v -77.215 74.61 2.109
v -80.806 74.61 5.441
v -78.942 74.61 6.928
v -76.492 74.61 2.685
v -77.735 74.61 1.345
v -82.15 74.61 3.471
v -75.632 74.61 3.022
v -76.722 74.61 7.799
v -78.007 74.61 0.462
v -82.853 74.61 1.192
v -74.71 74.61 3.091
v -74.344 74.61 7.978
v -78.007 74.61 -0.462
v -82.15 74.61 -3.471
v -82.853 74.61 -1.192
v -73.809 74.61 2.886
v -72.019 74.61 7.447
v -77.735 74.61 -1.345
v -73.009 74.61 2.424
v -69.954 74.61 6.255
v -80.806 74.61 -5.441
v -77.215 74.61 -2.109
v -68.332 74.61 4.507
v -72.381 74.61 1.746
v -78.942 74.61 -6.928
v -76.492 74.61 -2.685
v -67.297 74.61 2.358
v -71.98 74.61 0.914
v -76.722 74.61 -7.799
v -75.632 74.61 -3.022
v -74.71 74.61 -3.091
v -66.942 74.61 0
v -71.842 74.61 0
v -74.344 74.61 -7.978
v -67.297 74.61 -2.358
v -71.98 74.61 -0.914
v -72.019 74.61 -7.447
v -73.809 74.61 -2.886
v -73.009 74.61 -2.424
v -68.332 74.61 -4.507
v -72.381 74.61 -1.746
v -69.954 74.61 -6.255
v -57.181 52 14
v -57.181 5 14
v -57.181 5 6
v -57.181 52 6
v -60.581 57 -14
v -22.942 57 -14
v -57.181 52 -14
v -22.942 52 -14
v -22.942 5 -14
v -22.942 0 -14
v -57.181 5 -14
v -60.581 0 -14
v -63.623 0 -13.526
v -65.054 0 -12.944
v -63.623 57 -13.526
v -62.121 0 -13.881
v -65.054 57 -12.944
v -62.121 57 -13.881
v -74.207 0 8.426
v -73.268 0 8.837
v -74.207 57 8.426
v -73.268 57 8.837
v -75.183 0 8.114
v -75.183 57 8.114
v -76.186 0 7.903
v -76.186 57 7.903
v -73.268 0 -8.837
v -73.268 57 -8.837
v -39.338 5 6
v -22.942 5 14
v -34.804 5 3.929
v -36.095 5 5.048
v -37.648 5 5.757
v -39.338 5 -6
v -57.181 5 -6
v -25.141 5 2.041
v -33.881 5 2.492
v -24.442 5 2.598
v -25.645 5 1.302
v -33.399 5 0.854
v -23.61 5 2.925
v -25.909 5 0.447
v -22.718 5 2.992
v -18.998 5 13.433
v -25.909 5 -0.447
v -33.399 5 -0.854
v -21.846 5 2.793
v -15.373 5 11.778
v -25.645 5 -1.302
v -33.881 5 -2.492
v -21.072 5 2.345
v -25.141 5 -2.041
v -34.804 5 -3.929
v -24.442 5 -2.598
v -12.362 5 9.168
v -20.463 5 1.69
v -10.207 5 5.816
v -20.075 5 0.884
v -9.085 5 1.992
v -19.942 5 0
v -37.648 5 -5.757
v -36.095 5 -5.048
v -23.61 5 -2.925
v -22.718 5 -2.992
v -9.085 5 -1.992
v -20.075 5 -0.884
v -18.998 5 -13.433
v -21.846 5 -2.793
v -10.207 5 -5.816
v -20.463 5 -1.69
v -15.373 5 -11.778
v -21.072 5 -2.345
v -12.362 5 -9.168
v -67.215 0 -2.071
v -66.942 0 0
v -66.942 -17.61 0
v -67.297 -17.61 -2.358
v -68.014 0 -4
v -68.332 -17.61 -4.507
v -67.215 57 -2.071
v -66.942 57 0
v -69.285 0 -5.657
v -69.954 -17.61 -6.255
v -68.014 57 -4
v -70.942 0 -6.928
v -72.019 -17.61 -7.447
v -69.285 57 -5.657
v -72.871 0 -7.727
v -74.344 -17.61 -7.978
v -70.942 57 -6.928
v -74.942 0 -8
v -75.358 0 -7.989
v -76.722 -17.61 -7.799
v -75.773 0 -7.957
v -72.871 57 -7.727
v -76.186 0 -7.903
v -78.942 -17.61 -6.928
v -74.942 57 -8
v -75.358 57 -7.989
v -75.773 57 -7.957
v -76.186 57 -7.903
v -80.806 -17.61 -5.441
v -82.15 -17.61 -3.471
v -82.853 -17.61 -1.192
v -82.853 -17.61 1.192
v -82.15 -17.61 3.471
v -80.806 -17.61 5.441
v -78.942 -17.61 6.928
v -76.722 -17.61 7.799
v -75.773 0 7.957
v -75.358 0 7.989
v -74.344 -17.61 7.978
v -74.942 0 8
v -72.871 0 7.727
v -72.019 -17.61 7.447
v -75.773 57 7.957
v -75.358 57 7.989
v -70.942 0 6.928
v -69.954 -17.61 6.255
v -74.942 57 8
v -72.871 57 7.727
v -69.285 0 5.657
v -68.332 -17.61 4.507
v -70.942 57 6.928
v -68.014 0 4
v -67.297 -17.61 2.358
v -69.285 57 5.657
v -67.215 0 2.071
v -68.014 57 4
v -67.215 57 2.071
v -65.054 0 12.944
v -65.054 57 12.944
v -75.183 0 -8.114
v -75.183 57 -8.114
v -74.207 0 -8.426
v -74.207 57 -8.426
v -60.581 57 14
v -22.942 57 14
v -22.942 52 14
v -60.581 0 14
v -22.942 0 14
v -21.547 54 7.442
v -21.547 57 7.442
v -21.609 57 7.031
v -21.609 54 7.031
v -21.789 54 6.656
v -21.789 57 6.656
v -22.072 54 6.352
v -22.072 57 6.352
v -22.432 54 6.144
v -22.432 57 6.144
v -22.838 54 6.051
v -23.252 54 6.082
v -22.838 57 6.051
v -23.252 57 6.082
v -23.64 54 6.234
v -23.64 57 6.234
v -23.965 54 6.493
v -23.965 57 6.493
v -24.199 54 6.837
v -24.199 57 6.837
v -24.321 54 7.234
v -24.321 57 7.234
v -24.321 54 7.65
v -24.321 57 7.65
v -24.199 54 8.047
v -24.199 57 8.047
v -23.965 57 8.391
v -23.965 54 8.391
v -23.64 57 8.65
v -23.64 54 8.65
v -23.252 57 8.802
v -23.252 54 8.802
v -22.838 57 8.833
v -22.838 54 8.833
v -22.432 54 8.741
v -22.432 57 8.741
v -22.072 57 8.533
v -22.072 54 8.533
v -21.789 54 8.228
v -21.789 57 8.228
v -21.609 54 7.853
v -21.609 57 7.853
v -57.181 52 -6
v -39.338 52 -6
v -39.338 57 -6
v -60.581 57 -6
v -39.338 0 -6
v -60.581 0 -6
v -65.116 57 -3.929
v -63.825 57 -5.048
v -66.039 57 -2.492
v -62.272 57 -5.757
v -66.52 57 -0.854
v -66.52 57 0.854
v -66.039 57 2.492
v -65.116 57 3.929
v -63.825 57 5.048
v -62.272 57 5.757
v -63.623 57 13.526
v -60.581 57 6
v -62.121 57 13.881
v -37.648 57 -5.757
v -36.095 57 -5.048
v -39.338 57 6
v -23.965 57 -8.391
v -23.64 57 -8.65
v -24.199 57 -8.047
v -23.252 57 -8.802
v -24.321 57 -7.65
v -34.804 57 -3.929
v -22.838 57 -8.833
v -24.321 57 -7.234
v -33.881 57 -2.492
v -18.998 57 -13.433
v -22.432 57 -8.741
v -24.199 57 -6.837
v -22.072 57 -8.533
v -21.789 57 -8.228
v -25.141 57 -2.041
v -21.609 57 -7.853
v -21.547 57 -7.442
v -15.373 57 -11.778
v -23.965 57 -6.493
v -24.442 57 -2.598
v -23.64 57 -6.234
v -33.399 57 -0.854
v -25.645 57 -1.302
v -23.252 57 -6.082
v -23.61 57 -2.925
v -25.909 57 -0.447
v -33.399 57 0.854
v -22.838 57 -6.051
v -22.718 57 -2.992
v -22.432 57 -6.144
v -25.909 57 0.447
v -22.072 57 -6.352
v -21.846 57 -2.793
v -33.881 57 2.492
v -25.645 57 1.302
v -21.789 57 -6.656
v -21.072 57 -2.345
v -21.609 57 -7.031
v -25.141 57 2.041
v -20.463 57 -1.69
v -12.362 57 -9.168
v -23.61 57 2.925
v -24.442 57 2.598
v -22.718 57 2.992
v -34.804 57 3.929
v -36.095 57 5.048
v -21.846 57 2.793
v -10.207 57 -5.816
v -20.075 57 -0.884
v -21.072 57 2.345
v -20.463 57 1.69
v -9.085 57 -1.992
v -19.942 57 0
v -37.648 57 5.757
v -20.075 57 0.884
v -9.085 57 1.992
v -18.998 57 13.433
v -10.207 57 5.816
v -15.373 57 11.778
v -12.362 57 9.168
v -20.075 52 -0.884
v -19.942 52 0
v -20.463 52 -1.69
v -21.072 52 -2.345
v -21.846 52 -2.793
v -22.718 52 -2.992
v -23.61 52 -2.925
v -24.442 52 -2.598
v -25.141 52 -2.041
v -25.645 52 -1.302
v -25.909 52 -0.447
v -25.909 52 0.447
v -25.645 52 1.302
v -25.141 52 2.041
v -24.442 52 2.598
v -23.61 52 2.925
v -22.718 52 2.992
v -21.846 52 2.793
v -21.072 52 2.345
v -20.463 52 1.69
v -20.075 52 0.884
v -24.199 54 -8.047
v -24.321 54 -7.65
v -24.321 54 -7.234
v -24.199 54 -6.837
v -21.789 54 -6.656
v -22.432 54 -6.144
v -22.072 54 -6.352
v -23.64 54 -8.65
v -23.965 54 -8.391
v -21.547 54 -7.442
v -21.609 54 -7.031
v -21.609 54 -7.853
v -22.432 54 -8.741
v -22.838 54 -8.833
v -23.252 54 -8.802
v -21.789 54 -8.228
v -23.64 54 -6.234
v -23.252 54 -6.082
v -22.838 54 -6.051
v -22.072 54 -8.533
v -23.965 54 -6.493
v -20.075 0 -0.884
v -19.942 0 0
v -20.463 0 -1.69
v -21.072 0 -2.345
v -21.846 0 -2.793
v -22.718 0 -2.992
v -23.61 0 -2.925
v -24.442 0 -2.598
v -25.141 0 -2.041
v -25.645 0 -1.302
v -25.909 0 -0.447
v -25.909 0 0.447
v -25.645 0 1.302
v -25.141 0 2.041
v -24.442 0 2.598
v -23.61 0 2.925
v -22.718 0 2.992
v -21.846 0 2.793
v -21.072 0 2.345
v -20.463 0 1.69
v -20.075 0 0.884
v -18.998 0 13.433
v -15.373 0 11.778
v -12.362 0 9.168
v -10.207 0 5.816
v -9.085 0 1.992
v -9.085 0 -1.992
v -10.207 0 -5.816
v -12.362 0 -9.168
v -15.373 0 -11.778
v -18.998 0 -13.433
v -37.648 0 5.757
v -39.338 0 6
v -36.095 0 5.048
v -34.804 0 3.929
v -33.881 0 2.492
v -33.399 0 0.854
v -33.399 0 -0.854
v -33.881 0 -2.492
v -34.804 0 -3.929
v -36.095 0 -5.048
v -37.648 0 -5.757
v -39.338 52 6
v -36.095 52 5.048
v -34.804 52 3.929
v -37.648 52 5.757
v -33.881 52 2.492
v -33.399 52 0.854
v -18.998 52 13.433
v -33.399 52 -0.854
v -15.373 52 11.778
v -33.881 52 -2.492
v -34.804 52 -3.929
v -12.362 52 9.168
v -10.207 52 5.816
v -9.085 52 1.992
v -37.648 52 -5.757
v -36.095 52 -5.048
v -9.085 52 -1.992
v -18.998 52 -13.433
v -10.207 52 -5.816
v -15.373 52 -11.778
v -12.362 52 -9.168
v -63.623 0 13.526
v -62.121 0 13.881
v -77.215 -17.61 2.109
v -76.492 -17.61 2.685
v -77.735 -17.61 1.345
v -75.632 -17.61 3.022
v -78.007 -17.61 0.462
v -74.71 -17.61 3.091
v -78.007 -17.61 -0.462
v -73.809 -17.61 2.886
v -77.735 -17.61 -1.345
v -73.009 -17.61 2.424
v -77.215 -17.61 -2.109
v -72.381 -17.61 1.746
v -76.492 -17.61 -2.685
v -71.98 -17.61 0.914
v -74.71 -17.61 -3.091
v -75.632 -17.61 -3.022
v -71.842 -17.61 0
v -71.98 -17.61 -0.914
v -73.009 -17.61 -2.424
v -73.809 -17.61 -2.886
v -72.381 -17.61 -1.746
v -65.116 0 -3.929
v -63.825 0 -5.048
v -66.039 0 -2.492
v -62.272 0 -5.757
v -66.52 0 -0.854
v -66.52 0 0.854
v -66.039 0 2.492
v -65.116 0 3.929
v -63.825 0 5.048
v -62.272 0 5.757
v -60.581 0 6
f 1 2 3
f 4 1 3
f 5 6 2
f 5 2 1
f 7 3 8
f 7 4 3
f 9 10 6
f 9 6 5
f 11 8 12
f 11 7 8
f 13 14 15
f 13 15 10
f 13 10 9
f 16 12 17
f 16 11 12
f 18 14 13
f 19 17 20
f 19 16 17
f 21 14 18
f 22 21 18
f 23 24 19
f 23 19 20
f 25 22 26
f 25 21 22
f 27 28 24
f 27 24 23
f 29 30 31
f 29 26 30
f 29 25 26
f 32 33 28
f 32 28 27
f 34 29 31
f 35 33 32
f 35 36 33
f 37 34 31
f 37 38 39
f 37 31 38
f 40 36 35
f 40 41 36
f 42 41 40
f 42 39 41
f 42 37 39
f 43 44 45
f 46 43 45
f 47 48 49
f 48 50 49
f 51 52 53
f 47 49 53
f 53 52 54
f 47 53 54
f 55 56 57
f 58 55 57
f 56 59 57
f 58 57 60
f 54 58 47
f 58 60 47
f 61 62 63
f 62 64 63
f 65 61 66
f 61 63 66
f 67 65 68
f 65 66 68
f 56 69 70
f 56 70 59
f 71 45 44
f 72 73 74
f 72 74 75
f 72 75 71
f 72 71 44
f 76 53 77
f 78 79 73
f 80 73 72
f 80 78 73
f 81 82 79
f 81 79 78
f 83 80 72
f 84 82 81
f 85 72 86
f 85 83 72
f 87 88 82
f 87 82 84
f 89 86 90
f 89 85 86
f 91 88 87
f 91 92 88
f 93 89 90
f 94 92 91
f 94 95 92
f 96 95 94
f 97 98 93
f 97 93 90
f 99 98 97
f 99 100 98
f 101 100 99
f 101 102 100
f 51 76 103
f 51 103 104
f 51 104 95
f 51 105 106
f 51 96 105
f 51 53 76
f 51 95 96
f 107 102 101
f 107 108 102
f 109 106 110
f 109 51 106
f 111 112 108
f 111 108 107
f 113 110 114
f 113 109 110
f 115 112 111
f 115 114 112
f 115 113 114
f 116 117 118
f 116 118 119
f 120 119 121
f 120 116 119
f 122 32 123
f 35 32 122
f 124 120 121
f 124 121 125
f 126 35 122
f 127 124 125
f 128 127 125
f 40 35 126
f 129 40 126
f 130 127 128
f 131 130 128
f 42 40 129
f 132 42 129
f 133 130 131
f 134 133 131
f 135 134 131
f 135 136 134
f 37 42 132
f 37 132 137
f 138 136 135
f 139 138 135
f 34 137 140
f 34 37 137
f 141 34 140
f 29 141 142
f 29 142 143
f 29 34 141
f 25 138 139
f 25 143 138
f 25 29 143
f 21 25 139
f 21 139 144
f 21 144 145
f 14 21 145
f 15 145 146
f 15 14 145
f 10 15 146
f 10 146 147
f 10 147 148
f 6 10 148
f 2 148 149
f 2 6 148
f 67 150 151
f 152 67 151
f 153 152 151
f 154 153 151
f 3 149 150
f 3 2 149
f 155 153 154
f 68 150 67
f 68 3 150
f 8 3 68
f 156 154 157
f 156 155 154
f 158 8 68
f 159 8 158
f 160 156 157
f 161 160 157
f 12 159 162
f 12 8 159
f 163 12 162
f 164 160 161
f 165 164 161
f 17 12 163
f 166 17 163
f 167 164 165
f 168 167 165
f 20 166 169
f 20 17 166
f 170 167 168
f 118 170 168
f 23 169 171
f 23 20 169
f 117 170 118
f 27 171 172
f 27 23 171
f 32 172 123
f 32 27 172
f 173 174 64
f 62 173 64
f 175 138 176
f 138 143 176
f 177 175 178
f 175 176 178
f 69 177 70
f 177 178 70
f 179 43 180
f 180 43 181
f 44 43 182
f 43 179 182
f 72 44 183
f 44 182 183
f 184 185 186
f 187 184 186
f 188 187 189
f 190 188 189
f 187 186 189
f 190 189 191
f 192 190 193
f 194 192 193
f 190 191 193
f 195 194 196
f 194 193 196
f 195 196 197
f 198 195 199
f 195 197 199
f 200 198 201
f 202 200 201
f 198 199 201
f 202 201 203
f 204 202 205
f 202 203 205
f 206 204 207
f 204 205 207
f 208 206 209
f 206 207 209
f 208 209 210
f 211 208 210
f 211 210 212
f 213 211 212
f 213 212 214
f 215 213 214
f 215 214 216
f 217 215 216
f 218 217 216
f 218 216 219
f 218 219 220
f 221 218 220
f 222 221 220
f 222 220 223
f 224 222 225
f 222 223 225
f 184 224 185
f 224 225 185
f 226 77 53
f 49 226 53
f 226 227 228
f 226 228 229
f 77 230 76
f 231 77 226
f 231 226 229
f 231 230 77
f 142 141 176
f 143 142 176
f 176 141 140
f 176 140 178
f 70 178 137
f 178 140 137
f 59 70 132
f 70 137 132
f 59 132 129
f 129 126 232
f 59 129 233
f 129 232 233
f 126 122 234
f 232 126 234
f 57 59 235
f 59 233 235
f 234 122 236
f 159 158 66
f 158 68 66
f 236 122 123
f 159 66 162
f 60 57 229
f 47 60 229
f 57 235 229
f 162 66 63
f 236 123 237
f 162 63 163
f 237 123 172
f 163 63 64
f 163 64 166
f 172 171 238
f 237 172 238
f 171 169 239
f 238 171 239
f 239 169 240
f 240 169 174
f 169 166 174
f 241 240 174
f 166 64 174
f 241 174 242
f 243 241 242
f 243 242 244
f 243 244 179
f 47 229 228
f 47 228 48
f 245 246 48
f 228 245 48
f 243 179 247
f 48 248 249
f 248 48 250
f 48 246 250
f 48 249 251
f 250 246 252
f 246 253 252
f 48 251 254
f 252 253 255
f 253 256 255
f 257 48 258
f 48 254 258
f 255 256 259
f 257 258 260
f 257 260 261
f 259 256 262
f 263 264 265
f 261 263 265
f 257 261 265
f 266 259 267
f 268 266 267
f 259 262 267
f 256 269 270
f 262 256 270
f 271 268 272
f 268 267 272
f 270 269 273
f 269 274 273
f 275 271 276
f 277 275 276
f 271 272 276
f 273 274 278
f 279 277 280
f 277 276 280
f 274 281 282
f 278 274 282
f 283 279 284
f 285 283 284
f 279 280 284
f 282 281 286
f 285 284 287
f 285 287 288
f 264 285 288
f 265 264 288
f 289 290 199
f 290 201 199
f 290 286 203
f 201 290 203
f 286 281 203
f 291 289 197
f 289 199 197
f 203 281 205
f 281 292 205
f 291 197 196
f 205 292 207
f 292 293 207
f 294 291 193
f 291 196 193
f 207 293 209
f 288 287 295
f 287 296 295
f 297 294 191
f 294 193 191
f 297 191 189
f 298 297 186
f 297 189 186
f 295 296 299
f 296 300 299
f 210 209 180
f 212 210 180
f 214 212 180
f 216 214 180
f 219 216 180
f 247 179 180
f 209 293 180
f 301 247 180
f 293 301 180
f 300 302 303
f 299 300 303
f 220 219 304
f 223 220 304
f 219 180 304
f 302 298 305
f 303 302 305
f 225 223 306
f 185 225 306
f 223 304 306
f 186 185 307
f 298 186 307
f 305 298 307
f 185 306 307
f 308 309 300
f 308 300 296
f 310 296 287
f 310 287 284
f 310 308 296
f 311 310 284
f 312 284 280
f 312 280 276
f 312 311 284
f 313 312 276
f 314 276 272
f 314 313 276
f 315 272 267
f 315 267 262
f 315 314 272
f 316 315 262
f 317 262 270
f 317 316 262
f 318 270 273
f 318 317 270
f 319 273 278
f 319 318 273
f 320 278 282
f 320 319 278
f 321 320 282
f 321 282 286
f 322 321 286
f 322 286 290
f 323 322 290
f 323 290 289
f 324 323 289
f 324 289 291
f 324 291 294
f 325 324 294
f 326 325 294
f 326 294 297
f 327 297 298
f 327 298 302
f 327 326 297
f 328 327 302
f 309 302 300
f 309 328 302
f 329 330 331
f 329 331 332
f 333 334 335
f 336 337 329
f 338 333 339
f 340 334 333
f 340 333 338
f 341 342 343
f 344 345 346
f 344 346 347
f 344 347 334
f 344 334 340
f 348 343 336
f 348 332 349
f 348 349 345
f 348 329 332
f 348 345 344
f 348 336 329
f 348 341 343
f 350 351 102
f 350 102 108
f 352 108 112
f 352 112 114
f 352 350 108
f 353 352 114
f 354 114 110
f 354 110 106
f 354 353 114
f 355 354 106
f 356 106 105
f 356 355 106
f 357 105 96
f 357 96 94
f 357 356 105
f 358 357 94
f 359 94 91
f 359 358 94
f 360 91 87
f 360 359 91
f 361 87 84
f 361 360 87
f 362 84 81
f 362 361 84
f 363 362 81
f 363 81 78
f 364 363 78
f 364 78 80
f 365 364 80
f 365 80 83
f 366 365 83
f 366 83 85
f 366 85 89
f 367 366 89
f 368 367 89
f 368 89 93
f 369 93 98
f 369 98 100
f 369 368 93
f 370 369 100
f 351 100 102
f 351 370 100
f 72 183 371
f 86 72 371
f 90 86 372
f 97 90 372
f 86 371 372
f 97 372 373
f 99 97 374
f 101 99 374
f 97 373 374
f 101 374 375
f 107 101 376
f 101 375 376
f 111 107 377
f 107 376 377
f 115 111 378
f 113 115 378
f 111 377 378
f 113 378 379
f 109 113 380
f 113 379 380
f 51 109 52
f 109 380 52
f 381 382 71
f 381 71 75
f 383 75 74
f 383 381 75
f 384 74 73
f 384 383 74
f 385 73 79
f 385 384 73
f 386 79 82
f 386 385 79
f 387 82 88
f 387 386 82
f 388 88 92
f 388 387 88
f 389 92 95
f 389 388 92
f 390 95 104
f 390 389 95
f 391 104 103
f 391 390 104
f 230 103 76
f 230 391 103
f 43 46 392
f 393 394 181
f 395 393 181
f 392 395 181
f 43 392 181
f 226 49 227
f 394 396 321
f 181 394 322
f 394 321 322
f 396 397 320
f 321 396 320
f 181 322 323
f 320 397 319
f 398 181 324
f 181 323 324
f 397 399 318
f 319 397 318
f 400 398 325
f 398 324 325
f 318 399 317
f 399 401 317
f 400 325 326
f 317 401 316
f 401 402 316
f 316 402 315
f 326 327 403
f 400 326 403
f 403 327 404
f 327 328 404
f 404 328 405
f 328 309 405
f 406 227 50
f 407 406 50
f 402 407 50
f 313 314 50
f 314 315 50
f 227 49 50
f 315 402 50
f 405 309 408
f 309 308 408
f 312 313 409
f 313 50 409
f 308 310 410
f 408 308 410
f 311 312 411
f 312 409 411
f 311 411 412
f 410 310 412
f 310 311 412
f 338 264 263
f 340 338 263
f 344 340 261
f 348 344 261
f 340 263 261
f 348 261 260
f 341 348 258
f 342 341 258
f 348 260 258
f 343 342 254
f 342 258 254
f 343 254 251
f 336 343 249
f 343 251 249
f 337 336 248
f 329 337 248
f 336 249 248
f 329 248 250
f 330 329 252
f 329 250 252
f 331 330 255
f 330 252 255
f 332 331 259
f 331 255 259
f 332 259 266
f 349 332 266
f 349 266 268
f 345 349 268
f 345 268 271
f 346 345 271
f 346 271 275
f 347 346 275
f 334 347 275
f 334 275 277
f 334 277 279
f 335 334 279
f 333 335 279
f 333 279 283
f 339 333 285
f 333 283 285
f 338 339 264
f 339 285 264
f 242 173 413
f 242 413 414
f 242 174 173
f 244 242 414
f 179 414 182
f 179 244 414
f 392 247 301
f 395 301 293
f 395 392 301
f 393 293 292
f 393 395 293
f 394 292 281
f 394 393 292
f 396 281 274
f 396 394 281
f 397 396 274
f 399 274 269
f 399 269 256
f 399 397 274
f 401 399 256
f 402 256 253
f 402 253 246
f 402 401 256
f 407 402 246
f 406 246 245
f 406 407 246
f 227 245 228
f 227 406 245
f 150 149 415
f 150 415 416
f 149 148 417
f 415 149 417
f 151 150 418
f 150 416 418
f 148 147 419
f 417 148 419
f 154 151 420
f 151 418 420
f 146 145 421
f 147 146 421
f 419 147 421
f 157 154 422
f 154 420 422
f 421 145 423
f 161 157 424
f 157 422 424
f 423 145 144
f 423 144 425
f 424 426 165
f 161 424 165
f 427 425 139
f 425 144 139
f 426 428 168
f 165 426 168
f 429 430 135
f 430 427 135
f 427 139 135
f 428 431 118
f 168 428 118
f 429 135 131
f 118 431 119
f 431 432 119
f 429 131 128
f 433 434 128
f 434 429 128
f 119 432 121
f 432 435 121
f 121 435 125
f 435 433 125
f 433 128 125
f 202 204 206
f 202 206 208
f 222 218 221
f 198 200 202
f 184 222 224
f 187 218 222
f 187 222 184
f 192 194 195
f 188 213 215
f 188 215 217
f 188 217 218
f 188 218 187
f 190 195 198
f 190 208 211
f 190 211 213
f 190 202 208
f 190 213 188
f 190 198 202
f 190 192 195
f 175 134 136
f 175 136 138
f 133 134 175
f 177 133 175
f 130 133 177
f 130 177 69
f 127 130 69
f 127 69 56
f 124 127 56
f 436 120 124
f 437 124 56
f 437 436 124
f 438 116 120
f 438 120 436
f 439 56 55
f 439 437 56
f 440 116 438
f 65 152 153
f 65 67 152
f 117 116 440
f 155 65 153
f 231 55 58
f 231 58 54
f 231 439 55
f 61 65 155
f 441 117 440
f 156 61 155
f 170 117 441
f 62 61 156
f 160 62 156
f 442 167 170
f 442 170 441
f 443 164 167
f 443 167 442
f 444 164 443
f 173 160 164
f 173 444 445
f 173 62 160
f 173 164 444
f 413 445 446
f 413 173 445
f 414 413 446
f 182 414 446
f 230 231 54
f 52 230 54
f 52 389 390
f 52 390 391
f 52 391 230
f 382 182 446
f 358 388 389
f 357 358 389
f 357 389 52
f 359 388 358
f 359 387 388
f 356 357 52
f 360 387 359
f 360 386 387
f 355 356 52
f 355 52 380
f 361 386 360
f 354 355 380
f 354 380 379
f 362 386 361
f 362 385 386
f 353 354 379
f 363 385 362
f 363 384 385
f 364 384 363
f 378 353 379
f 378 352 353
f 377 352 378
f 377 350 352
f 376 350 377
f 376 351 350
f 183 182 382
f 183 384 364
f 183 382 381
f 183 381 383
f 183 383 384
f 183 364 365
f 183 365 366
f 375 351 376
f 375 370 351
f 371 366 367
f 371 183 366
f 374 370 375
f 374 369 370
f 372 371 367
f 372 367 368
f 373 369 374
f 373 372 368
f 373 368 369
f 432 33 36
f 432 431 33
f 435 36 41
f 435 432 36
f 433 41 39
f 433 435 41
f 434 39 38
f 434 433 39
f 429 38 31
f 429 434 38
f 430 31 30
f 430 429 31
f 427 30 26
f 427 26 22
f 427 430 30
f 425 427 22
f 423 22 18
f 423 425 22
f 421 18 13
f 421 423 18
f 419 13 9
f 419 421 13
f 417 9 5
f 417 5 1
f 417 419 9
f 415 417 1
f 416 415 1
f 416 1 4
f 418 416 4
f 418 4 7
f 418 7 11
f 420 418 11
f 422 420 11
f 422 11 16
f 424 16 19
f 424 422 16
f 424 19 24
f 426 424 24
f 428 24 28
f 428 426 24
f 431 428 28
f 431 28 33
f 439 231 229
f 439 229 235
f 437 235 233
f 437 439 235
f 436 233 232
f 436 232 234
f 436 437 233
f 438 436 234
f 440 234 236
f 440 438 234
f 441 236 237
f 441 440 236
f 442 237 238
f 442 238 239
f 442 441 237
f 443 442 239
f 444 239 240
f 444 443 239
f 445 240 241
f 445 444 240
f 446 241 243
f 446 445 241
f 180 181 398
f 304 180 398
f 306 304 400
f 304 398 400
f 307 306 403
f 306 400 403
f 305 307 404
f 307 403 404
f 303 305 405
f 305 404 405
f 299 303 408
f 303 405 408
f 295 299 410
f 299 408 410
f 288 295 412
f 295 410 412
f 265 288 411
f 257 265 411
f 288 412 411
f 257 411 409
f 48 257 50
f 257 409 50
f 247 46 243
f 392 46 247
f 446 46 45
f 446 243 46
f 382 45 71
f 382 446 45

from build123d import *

# Parameters (mm, degrees)
SKETCH1_R                = 3
BOSS_EXTRUDE4_DEPTH      = 5
SKETCH4_W                = 5.761442696
SKETCH4_H                = 28
BOSS_EXTRUDE5_DEPTH      = 47
SKETCH6_W                = 5.761442696
SKETCH6_H                = 28
SKETCH6_R                = 14
SKETCH6_R_2              = 3
BOSS_EXTRUDE6_DEPTH      = 5
SKETCH8_R                = 8
SKETCH8_R_2              = 3.1
BOSS_EXTRUDE7_DEPTH      = 17.61
BOSS_EXTRUDE7_DEPTH_BACK = 74.61
BOSS_EXTRUDE8_DEPTH      = 57
FILLET1_R                = 10
FILLET2_R                = 10
CUT_EXTRUDE1_DEPTH       = 57
SKETCH14_R               = 1.395
CUT_EXTRUDE2_DEPTH       = 3


with BuildPart() as part:
    # Sketch1 → Boss-Extrude4 (new body)
    with BuildSketch(Plane(origin=(0, 0, 0), x_dir=(1, 0, 0), z_dir=(0, 1, 0))):
        with BuildLine():
            Line((-62.942048288, -14), (-22.942048288, -14))
            ThreePointArc((-22.942048288, -14), (-8.942048288, 0), (-22.942048288, 14))
            Line((-22.942048288, 14), (-62.942048288, 14))
            Line((-62.942048288, 14), (-62.942048288, -14))
        make_face()
        with Locations((-22.942048288, 0)):
            Circle(SKETCH1_R, mode=Mode.SUBTRACT)
    extrude(amount=BOSS_EXTRUDE4_DEPTH)

    # Sketch4 → Boss-Extrude5 (add)
    with BuildSketch(Plane(origin=(0, 5, 0), x_dir=(1, 0, 0), z_dir=(0, 1, 0))):
        with Locations((-60.06132694, 0)):
            Rectangle(SKETCH4_W, SKETCH4_H)
    extrude(amount=BOSS_EXTRUDE5_DEPTH)

    # Sketch6 → Boss-Extrude6 (add)
    with BuildSketch(Plane(origin=(0, 52, 0), x_dir=(1, 0, 0), z_dir=(0, 1, 0))):
        with BuildLine():
            ThreePointArc((-22.942048288, -14), (-36.942048288, 0), (-22.942048288, 14))
            Line((-22.942048288, 14), (-57.180605592, 14))
            Line((-57.180605592, 14), (-57.180605592, -14))
            Line((-57.180605592, -14), (-22.942048288, -14))
        make_face()
        with Locations((-60.06132694, 0)):
            Rectangle(SKETCH6_W, SKETCH6_H)
        with Locations((-22.942048288, 0)):
            Circle(SKETCH6_R)
        with Locations((-22.942048288, 0)):
            Circle(SKETCH6_R_2, mode=Mode.SUBTRACT)
    extrude(amount=BOSS_EXTRUDE6_DEPTH)



with BuildPart() as body_2:
    # Sketch8 → Boss-Extrude7 (new body, two sides)
    with BuildSketch(Plane(origin=(0, 57, 0), x_dir=(1, 0, 0), z_dir=(0, 1, 0))) as boss_extrude7_sk:
        with Locations((-74.942048288, 0)):
            Circle(SKETCH8_R)
        with Locations((-74.942048288, 0)):
            Circle(SKETCH8_R_2, mode=Mode.SUBTRACT)
    extrude(amount=BOSS_EXTRUDE7_DEPTH)
    extrude(boss_extrude7_sk.sketch, amount=-BOSS_EXTRUDE7_DEPTH_BACK)


with BuildPart() as part_1:
    add(part.part)

    add(body_2.part)  # Boss-Extrude8 merges body 2
    # Sketch11 → Boss-Extrude8 (add)
    with BuildSketch(Plane.XZ):
        with BuildLine():
            Line((-62.942048288, 14), (-74.942048288, 8))
            ThreePointArc((-74.942048288, 8), (-69.285194038, 5.656854249), (-66.942048288, 0))
            ThreePointArc((-66.942048288, 0), (-69.285194038, -5.656854249), (-74.942048288, -8))
            Line((-74.942048288, -8), (-62.942048288, -14))
            Line((-62.942048288, -14), (-62.942048288, 14))
        make_face()
    extrude(amount=-BOSS_EXTRUDE8_DEPTH)

    # Fillet1
    fillet1_edges = [part_1.edges().sort_by_distance(p)[0] for p in [
        (-62.942048288, 28.5, 14),
        (-62.942048288, 28.5, -14),
    ]]
    fillet(fillet1_edges, radius=FILLET1_R)

    # Fillet2
    fillet2_edges = [part_1.edges().sort_by_distance(p)[0] for p in [
        (-74.942048288, 28.5, 8),
        (-74.942048288, 28.5, -8),
    ]]
    fillet(fillet2_edges, radius=FILLET2_R)

    # Sketch13 → Cut-Extrude1 (cut)
    with BuildSketch(Plane.XZ):
        with BuildLine():
            Line((-60.581368513, 6), (-39.338409666, 6))
            ThreePointArc((-39.338409666, 6), (-33.338409666, 0), (-39.338409666, -6))
            Line((-39.338409666, -6), (-60.581368513, -6))
            ThreePointArc((-60.581368513, -6), (-66.581368513, 0), (-60.581368513, 6))
        make_face()
    extrude(amount=-CUT_EXTRUDE1_DEPTH, mode=Mode.SUBTRACT)

    # Sketch14 → Cut-Extrude2 (cut)
    with BuildSketch(Plane(origin=(0, 57, 0), x_dir=(1, 0, 0), z_dir=(0, 1, 0))):
        with Locations((-22.942048288, 7.4422)):
            Circle(SKETCH14_R)
        with Locations((-22.942048288, -7.4422)):
            Circle(SKETCH14_R)
    extrude(amount=-CUT_EXTRUDE2_DEPTH, mode=Mode.SUBTRACT)


solid = part_1.part
